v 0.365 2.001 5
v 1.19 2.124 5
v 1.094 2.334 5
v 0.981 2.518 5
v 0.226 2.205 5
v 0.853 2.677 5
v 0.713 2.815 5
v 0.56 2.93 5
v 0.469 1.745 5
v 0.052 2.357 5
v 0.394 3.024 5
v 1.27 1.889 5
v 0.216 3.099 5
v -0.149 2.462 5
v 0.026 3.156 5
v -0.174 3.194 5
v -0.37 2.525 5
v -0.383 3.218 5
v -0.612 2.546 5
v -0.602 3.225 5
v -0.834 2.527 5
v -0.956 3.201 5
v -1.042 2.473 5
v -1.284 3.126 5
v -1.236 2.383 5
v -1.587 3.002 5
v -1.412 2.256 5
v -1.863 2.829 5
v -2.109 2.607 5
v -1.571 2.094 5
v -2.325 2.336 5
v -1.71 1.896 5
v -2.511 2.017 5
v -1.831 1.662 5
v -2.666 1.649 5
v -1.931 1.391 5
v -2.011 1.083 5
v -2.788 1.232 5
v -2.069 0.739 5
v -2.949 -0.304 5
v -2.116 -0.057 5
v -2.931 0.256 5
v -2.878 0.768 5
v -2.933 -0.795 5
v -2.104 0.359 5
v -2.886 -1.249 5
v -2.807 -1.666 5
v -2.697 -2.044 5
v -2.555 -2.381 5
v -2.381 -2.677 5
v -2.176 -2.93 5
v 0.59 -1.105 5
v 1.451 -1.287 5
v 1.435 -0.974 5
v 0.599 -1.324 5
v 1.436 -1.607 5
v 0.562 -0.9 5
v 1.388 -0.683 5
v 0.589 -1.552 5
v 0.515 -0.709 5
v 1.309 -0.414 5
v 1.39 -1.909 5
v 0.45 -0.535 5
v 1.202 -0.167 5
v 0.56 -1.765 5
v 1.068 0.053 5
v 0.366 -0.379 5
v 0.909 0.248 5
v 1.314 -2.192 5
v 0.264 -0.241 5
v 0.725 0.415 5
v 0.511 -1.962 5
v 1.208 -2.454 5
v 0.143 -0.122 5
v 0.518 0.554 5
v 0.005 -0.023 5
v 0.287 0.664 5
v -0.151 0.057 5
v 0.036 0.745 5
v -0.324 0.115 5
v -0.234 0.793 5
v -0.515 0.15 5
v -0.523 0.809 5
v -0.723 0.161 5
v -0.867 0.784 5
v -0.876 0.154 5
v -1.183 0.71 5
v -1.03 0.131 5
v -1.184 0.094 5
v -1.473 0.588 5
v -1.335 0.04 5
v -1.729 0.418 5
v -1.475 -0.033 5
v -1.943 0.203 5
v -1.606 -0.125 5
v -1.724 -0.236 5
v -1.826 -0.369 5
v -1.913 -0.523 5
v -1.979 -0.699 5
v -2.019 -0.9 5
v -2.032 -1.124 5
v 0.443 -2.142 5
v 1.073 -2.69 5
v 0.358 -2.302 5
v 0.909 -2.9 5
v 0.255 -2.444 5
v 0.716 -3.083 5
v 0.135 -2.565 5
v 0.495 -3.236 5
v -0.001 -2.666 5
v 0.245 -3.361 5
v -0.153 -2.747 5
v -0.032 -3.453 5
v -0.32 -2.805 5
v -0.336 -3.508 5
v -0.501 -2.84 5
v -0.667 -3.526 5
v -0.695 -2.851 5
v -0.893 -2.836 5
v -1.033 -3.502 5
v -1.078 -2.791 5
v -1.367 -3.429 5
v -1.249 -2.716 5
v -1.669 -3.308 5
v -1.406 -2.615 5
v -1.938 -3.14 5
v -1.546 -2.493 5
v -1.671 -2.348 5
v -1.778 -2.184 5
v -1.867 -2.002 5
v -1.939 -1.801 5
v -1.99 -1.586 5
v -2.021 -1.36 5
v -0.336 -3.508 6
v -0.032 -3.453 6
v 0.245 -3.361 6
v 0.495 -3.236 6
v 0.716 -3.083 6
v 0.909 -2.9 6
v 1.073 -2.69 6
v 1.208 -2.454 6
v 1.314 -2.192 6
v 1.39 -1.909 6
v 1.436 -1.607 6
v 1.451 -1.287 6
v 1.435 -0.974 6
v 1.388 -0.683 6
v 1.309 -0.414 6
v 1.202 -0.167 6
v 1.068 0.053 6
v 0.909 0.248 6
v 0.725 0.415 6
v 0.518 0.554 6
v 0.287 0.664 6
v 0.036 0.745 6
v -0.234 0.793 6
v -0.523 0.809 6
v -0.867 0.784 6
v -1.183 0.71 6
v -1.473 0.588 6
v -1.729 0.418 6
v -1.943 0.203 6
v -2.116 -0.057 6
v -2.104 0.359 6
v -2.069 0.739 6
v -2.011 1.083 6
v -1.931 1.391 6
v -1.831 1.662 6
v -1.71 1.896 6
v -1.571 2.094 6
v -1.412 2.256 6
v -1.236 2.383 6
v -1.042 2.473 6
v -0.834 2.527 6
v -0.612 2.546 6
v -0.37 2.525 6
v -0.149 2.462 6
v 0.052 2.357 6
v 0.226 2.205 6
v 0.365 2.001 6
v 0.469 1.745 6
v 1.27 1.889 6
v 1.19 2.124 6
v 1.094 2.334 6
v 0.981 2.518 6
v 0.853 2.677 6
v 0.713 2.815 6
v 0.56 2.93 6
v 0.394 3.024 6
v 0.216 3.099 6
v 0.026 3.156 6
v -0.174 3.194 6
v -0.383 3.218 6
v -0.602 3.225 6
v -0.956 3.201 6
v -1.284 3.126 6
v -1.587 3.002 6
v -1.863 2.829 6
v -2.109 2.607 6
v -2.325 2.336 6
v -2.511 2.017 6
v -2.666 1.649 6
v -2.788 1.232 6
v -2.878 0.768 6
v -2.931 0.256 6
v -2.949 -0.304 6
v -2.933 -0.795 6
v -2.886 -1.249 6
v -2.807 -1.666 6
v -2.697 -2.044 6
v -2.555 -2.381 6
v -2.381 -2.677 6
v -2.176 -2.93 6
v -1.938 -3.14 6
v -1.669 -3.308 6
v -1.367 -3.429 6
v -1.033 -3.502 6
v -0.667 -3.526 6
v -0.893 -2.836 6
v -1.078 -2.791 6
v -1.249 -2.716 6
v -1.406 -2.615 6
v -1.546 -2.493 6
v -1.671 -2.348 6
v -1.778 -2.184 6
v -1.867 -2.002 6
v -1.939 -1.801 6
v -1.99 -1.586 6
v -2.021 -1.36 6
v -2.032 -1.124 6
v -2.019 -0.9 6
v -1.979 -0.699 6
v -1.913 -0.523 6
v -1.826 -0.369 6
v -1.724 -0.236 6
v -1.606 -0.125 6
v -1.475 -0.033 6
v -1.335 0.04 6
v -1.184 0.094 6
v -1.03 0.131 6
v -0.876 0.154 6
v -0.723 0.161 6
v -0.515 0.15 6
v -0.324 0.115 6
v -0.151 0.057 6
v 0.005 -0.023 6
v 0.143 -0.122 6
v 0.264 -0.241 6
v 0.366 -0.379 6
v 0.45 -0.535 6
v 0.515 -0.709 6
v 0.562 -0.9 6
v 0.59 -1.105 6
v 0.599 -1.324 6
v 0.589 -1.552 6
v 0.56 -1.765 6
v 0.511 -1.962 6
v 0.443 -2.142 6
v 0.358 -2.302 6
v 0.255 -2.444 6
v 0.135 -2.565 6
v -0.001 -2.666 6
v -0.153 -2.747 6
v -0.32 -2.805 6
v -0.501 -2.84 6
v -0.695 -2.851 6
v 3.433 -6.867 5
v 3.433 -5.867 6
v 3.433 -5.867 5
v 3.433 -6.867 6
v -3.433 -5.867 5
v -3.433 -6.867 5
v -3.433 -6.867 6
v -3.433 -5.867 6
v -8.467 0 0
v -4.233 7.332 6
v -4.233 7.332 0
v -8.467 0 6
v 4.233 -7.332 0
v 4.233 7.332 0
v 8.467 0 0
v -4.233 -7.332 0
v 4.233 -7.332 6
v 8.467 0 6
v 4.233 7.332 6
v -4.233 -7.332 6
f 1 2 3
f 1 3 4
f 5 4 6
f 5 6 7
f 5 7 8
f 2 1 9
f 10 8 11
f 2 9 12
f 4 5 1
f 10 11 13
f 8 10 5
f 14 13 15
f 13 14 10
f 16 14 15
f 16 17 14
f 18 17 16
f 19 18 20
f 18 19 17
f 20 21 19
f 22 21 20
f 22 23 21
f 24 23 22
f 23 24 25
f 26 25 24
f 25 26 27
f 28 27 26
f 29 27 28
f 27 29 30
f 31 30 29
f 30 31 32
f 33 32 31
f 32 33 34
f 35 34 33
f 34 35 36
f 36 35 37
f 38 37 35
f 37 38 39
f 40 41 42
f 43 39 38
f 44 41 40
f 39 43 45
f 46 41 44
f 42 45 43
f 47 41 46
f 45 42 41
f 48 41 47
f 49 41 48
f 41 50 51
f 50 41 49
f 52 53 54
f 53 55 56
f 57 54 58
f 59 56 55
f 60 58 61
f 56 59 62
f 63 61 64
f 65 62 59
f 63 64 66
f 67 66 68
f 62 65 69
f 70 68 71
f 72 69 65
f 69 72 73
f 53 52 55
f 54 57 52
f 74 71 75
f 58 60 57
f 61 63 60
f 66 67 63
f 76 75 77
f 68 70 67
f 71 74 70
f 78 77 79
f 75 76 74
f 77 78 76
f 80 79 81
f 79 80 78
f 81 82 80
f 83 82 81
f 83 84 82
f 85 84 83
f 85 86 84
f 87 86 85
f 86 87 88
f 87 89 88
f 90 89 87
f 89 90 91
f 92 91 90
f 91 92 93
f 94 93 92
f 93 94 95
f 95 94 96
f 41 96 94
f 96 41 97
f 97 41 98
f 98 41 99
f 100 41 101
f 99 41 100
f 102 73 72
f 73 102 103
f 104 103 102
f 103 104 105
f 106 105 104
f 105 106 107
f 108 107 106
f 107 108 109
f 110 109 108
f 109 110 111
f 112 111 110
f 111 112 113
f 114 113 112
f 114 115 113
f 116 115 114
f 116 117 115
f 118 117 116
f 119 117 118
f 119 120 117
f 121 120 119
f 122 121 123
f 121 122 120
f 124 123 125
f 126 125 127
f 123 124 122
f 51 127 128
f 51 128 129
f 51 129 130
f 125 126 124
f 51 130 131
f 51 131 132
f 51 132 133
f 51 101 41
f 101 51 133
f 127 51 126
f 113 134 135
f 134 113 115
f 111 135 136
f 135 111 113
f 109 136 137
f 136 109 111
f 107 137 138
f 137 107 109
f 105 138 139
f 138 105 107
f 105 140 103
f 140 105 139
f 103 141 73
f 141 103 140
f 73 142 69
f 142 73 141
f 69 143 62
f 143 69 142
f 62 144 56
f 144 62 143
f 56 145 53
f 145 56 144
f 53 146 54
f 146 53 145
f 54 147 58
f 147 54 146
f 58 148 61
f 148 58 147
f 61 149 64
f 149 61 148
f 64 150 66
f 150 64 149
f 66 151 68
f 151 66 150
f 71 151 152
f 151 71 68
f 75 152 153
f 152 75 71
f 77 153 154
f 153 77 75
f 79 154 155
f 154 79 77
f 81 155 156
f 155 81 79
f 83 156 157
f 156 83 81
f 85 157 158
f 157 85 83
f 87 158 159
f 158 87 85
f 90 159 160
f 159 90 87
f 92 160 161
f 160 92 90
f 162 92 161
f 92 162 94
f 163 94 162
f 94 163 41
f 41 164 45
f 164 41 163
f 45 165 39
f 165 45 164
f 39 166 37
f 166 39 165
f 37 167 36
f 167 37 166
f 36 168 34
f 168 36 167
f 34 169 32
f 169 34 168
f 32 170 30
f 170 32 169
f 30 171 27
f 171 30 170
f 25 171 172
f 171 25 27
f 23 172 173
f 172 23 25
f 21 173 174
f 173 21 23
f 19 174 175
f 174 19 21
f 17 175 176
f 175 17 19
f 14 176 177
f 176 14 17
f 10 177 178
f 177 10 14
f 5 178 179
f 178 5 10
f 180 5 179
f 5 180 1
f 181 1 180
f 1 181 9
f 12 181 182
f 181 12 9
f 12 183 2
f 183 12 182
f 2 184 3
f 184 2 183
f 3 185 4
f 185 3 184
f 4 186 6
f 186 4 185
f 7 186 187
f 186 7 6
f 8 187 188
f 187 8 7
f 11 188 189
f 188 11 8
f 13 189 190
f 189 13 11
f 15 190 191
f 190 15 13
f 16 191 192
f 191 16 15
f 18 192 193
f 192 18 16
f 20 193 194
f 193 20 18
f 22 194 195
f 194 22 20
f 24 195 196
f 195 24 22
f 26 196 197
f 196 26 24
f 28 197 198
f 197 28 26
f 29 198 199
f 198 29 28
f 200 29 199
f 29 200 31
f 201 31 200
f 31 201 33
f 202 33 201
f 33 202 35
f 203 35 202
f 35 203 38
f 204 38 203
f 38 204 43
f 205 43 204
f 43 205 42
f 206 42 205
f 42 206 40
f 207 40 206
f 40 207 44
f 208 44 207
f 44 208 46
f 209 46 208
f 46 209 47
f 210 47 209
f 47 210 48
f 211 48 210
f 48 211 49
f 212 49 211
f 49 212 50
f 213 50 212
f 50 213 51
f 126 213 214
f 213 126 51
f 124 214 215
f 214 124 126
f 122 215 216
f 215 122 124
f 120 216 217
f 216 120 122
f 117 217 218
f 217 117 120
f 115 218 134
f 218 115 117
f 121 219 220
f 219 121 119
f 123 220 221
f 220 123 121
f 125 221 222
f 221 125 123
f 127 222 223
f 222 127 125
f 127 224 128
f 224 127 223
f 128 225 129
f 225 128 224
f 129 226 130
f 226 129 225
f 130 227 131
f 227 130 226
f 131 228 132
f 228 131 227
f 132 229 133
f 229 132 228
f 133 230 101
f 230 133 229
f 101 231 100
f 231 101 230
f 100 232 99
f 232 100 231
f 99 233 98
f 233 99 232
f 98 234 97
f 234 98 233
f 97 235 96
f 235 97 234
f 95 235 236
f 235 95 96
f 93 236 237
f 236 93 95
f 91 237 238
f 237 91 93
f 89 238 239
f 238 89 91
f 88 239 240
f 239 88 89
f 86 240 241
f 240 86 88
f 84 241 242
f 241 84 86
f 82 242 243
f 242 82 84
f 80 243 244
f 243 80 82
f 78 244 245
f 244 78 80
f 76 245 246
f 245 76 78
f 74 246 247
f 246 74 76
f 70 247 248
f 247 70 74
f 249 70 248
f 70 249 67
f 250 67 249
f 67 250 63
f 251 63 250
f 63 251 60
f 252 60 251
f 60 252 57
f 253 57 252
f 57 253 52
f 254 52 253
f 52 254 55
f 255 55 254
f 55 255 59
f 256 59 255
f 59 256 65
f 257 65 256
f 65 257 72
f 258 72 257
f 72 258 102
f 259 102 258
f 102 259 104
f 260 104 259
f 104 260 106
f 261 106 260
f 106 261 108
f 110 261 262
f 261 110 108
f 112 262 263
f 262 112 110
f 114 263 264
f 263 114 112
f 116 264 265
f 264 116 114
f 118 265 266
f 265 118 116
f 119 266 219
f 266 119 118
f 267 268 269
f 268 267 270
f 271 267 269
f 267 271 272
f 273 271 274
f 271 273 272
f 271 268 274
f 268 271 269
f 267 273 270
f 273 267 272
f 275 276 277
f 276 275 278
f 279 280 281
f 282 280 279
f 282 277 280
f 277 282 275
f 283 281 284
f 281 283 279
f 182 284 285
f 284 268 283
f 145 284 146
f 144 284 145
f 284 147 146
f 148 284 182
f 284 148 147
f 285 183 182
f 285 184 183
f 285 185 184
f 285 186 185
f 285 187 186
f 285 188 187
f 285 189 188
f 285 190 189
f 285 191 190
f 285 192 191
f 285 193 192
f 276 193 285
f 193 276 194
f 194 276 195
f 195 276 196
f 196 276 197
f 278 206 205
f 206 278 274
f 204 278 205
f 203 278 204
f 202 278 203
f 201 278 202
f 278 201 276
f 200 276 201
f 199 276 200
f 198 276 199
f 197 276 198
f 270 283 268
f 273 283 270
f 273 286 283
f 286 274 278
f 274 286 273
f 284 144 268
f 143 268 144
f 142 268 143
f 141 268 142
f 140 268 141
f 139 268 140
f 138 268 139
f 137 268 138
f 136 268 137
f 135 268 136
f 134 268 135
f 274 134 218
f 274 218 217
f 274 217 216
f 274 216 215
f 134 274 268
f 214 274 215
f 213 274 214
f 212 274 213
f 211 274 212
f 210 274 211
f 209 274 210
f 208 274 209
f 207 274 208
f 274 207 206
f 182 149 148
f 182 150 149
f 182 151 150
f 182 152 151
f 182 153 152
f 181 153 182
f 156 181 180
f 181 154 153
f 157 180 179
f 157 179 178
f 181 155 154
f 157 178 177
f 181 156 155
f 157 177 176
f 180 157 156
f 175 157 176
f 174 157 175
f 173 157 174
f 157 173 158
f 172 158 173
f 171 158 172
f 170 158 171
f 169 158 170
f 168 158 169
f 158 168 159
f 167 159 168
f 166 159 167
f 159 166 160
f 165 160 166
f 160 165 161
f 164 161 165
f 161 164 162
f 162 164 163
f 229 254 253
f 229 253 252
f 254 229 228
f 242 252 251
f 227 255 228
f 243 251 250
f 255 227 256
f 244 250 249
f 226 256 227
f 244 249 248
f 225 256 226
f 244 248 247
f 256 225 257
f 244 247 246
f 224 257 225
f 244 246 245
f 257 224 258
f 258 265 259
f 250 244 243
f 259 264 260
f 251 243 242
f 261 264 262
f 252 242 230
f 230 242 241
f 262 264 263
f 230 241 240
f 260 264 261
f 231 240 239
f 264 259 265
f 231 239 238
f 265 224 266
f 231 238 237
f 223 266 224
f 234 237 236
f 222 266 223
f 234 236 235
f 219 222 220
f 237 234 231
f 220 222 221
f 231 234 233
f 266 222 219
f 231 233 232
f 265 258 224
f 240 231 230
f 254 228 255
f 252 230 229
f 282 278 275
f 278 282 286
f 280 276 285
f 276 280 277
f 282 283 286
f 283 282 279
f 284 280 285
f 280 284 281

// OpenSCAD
// file: ../library/calculate.scad
module inlay(depth)
{
    difference()
    {
        children(0);
        translate([ 0, 0, depth ]) children([1:$children - 1]);
    }
}
// file: ../library/variables.scad
// Variables

die_width = 12;
double_digit_placement = 1; // 0.7 for 8mm, 1 for 12mm

wiggle_width = 0.2;
separator = 1.6;
base_plate_sides = 5;
token_sides = 6;
slot_height = 1;

// Calculations

height = die_width / 2;

die_slot_width = die_width + wiggle_width;
die_slot_y = -1 * ((die_slot_width / 2) + separator);
die_slot_right_x = (die_slot_width / 2) + separator;
die_slot_left_x = -1 * (die_slot_width / 2) - separator;

base_plate_size = (die_slot_width * 2) + separator;
inset_width = base_plate_size - separator;
inset_depth = height - separator;

shallow_slot_height = (height - inset_depth) / 2;

token_slot_width = base_plate_size / 3;
token_width = token_slot_width - wiggle_width;
token_height = height;
token_slot_y = (die_slot_width / 2) + (separator * 2);
token_inset_height = token_height - 1;
token_doubledigit_font_size = token_width - separator;

token_poison_width = (token_width / 3);
token_poison_placement = (token_width / 3);
// file: ../library/tokens.scad
include <variables.scad>
include <calculate.scad>

module token_base()
{
    linear_extrude(token_height) circle(token_width, $fn = token_sides);
}

module token_doubledigit_number(num) 
{
    inlay(depth = token_inset_height) 
    {
        token_base();
        translate([-1 * token_doubledigit_font_size + double_digit_placement, -1 * token_doubledigit_font_size / 2, 0]) linear_extrude(token_height) text(text = num, size = token_doubledigit_font_size);
        translate([-1 * token_doubledigit_font_size / 2, -1 * token_doubledigit_font_size, 0]) cube([token_doubledigit_font_size, 1, 2]);
    }
}

module token_singledigit_number(num) 
{ 
    inlay(depth = token_inset_height) 
    {
        token_base();
        translate([-1 * (token_doubledigit_font_size / 2), -1 * token_doubledigit_font_size / 2, 0]) linear_extrude(token_height) text(text = num, size = token_doubledigit_font_size);
        translate([-1 * token_doubledigit_font_size / 2, -1 * token_doubledigit_font_size, 0]) cube([token_doubledigit_font_size, 1, 2]);
    }
}
// main file
include <../library/tokens.scad>

token_singledigit_number("6");
